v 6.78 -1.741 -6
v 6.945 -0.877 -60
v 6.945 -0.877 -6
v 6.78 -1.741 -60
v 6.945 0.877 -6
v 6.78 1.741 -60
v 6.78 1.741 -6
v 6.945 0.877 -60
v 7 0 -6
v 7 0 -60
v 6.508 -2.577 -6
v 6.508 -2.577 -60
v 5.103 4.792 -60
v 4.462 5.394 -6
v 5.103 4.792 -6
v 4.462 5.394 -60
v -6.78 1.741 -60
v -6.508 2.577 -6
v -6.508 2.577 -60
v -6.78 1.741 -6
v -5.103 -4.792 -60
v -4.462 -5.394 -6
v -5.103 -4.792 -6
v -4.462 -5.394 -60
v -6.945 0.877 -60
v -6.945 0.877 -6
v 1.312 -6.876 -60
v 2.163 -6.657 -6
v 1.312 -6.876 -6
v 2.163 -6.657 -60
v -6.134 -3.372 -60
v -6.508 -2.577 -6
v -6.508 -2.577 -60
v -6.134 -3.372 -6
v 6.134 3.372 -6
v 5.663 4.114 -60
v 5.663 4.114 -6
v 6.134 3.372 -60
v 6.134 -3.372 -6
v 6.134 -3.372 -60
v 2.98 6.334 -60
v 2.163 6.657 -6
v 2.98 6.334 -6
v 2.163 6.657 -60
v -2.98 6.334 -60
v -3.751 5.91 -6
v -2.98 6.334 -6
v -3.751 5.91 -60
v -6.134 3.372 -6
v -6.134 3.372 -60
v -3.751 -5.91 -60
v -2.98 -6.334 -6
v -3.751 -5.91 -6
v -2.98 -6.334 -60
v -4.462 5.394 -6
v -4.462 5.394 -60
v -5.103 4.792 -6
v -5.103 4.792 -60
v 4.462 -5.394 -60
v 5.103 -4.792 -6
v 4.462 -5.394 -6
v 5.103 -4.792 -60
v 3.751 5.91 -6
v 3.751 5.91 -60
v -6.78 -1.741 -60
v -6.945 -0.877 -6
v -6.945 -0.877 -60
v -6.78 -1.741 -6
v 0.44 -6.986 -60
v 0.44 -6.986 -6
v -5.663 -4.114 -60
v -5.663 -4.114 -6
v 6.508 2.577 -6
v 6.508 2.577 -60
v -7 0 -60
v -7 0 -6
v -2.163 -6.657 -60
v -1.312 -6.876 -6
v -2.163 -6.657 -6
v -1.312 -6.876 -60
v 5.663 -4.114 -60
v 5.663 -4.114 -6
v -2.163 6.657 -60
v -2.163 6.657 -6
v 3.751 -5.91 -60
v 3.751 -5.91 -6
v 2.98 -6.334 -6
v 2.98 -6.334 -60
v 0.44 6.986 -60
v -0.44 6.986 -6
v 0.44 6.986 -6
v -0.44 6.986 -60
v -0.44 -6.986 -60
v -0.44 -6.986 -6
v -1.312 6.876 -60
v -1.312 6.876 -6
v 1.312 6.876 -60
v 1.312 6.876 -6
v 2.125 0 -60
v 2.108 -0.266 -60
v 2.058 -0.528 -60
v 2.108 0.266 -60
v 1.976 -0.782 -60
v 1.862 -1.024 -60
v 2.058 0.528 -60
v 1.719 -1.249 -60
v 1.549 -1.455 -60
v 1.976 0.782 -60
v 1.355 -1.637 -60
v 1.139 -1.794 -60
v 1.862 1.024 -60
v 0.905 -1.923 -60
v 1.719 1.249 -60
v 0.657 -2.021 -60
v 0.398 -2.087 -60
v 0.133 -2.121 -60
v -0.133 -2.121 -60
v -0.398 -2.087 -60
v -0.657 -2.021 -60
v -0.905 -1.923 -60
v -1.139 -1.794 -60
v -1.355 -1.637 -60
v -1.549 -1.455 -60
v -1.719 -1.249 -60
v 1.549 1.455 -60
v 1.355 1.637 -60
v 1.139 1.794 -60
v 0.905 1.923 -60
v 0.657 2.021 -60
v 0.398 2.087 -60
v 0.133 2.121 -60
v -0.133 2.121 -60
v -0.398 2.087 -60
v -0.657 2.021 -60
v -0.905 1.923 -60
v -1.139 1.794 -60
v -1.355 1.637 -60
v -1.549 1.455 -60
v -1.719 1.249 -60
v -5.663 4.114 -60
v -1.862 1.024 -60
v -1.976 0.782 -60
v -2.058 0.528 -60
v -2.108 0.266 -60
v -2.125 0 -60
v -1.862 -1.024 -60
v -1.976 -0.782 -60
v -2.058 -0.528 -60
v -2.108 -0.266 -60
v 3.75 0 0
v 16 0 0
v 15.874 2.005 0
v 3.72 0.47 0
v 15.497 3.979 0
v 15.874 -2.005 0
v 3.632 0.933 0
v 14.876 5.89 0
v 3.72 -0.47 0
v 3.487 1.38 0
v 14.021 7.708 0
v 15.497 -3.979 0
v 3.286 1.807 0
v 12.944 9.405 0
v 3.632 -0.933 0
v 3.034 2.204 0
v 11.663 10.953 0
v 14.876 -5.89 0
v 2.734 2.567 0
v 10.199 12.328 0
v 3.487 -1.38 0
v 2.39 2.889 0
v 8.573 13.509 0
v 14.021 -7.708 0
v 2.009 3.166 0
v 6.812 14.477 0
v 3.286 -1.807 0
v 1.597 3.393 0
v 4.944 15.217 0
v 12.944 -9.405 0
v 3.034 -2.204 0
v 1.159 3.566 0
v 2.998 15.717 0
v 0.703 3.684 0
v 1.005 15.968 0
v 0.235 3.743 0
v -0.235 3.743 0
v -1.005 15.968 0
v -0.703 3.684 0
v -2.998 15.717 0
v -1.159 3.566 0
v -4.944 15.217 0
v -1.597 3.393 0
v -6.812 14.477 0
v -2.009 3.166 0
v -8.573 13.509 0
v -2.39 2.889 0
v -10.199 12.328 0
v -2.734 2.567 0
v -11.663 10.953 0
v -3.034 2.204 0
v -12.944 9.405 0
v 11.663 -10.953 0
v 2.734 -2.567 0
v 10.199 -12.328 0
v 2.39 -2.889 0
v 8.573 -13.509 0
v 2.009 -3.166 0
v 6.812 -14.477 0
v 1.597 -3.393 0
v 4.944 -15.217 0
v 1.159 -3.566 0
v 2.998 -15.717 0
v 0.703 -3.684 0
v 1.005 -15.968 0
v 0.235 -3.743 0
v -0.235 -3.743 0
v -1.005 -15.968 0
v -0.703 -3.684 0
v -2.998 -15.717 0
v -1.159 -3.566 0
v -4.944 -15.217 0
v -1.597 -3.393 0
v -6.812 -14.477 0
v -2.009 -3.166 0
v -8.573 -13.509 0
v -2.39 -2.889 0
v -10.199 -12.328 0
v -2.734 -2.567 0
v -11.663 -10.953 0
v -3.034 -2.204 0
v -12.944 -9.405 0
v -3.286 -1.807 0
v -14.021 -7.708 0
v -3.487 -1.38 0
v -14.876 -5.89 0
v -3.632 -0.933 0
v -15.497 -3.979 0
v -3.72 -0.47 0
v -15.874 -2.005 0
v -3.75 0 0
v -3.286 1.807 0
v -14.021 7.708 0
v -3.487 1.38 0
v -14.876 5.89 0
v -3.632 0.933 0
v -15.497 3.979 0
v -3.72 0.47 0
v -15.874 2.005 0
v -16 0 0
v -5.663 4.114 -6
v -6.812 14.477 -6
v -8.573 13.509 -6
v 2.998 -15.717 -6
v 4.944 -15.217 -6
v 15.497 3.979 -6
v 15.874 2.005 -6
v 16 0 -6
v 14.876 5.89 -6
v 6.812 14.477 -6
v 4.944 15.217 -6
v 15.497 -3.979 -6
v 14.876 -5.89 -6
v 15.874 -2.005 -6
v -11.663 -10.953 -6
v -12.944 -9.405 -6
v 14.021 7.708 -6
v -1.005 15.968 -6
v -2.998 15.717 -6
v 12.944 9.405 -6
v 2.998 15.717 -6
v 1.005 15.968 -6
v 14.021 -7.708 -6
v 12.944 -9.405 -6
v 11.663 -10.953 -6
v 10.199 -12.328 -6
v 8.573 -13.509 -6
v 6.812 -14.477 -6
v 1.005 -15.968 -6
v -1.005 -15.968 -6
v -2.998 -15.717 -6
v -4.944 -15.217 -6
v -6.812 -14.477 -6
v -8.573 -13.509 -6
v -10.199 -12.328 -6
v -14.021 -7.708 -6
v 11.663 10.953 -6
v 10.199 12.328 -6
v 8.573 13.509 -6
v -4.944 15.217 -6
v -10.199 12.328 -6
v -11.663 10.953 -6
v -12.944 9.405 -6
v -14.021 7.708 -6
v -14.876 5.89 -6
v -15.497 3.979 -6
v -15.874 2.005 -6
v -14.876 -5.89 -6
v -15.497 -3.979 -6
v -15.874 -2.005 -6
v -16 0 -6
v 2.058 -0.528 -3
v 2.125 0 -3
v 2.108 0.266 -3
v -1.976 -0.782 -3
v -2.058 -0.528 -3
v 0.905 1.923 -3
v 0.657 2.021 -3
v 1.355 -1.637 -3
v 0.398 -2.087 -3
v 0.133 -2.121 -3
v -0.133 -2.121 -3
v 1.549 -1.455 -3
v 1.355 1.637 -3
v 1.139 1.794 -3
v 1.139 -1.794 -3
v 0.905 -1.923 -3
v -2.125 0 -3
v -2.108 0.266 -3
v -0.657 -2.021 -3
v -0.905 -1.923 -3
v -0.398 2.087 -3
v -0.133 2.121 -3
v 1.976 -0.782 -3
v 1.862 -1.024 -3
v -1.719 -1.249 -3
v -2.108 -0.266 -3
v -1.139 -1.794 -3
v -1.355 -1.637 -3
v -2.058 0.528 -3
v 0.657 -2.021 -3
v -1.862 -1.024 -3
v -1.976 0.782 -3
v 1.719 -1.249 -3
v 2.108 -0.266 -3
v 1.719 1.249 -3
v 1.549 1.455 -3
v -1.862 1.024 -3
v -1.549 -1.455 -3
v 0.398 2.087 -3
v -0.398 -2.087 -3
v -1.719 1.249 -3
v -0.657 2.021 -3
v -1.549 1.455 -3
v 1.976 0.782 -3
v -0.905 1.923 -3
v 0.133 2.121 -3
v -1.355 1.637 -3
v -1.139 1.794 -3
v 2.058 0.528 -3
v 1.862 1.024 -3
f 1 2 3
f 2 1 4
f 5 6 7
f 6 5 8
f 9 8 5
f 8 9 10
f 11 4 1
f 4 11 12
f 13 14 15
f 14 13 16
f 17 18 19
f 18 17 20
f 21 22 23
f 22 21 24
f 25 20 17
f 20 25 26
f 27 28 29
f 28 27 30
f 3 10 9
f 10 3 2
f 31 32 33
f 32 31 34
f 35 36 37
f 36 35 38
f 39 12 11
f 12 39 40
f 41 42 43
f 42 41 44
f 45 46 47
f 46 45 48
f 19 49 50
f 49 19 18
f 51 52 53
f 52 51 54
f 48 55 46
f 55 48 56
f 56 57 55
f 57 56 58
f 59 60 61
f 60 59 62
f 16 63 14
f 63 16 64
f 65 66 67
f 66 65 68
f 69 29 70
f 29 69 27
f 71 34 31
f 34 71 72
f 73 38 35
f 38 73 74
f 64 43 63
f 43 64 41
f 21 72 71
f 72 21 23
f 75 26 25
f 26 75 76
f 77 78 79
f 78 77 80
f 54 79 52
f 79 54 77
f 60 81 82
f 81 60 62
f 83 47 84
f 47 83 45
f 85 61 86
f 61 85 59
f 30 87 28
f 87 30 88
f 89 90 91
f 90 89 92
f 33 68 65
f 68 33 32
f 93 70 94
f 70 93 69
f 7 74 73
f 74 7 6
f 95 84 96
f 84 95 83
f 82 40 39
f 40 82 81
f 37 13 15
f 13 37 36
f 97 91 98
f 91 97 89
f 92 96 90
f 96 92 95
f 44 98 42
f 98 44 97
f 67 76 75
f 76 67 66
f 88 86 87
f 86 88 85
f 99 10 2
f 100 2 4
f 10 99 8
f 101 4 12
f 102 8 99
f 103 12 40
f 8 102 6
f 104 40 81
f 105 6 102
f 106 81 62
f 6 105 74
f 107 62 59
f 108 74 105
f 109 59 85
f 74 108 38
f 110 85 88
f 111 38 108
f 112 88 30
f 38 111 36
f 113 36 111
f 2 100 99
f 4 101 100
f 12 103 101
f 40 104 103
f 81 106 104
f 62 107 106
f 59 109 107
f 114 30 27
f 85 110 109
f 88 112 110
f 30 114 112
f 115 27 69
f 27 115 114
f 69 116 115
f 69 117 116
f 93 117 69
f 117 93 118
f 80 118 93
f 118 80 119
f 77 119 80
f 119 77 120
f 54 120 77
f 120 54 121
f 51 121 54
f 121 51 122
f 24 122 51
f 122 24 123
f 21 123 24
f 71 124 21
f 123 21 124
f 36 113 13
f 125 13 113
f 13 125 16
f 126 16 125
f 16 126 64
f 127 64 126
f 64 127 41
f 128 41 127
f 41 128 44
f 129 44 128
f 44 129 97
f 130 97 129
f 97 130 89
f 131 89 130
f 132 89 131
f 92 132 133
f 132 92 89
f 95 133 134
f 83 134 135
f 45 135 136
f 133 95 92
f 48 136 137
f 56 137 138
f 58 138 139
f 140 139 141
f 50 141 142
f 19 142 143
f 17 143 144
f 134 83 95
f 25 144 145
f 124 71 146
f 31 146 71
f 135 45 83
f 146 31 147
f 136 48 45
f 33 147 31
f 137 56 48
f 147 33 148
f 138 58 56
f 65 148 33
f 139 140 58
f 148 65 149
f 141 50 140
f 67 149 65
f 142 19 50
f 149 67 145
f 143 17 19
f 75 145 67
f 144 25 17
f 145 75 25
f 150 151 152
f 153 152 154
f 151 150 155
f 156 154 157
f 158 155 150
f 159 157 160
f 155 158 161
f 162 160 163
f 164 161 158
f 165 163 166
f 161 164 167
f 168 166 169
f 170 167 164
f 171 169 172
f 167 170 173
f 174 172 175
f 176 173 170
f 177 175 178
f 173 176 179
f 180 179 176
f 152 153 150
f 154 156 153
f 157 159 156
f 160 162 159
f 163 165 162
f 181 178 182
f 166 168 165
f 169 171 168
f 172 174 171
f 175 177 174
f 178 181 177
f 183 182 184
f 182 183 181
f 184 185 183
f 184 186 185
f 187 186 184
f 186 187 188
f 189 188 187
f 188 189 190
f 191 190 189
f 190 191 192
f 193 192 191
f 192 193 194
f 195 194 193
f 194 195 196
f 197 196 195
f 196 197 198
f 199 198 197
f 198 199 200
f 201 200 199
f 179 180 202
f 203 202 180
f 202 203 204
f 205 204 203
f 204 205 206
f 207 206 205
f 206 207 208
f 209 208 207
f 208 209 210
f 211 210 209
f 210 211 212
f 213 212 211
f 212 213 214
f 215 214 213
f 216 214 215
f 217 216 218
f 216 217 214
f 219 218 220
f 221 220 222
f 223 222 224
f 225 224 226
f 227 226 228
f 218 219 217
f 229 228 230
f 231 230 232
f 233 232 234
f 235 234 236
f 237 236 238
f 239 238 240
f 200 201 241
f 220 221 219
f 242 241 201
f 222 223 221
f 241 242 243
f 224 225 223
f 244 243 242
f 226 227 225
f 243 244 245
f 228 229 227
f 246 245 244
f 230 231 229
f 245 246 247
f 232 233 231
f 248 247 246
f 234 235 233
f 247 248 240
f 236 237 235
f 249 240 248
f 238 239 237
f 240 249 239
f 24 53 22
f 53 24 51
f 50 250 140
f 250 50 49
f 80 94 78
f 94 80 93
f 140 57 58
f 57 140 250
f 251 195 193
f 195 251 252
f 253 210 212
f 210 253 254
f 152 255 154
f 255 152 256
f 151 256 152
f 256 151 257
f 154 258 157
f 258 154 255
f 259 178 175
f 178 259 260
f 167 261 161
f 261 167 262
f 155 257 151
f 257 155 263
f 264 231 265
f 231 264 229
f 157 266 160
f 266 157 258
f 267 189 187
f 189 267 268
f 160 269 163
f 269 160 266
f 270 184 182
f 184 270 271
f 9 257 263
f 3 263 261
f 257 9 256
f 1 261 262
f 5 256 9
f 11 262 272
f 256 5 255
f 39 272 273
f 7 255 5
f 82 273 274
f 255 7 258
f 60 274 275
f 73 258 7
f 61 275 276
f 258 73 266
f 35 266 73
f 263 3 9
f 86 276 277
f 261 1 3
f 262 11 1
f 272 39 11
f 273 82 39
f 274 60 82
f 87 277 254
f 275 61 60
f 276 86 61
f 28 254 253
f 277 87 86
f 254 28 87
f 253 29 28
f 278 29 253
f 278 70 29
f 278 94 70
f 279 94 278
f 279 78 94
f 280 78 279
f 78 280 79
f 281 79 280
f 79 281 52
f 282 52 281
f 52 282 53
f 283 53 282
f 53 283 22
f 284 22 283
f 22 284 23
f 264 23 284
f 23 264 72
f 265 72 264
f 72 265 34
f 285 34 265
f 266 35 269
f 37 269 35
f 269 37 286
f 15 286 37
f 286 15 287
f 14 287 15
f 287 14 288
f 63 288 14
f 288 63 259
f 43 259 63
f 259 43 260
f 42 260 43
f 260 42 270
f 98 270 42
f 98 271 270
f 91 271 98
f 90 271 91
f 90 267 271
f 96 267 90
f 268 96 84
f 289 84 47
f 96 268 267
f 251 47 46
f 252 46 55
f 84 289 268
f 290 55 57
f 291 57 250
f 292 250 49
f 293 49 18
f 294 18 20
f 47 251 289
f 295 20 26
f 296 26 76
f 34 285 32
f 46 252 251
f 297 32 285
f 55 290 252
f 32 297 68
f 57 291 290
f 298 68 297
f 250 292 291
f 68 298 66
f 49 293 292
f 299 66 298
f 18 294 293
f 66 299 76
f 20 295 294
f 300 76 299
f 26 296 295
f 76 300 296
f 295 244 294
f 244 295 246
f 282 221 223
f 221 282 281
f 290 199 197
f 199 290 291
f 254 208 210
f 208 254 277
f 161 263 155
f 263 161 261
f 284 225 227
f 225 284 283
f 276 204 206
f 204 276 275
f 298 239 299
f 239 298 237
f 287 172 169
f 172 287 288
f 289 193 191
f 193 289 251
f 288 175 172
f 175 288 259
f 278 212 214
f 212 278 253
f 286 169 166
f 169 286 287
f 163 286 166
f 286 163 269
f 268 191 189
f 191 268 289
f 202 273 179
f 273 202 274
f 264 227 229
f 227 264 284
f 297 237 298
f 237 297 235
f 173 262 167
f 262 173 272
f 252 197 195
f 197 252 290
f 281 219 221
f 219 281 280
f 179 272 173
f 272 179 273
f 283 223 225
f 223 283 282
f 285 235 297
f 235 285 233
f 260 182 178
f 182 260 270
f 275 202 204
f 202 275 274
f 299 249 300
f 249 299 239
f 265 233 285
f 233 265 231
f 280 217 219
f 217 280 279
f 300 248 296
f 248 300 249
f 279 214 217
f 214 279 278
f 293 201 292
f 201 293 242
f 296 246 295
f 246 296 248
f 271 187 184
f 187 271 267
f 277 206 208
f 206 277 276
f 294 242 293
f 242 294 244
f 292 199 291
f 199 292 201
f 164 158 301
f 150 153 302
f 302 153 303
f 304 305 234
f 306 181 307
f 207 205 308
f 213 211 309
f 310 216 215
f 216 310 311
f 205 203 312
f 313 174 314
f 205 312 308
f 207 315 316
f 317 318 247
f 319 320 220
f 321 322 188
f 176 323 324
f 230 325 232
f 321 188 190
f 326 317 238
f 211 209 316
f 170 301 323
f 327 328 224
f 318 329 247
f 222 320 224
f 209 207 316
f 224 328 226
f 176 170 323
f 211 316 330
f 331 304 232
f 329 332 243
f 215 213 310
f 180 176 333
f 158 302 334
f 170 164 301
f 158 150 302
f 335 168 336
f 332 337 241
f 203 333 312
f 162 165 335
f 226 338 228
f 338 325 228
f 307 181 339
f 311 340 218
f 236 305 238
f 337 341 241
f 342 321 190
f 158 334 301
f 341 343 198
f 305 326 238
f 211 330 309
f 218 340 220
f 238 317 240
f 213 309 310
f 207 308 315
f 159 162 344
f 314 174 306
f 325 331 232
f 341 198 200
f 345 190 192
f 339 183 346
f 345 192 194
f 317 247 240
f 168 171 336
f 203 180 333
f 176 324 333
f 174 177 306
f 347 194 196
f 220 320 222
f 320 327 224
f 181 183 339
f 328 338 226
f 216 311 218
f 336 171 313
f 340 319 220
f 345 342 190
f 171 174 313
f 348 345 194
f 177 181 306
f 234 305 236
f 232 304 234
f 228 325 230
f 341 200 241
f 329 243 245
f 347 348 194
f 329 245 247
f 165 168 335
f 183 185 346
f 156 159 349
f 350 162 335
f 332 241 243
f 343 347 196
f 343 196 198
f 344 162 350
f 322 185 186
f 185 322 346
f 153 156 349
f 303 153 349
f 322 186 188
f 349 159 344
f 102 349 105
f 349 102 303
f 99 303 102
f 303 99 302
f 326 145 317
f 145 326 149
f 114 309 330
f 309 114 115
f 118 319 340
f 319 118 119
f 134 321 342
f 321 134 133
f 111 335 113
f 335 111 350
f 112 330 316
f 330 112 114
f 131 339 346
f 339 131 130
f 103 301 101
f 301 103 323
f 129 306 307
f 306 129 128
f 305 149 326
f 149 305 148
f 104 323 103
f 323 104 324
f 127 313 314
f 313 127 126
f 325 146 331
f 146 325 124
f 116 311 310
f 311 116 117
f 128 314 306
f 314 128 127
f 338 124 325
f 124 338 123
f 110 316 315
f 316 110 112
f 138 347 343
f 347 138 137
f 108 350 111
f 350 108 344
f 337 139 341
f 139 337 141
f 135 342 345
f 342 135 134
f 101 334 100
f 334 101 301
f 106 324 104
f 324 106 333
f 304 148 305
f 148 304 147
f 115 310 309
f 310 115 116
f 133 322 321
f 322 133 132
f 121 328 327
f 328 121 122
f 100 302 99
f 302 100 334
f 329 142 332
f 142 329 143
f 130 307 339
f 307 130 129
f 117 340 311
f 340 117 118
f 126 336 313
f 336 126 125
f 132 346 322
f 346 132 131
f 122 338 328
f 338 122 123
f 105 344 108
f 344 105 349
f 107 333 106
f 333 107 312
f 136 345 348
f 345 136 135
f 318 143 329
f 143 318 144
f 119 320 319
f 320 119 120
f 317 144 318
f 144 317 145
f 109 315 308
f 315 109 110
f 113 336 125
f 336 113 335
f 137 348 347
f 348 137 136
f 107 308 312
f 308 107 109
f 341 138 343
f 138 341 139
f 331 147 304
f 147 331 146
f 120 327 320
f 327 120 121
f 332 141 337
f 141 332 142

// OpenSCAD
$fn = 50;


difference() {
	union() {
		translate(v = [0, 0, -60.0000000000]) {
			cylinder(h = 60, r = 7.0000000000);
		}
		translate(v = [0, 0, -6.0000000000]) {
			cylinder(h = 6, r = 16.0000000000);
		}
	}
	union() {
		translate(v = [0, 0, 0]) {
			rotate(a = [0, 0, 0]) {
				difference() {
					union() {
						#translate(v = [0, 0, -60.0000000000]) {
							cylinder(h = 60, r = 2.0000000000);
						}
						#translate(v = [0, 0, -3]) {
							cylinder(h = 3, r = 7.0000000000, r1 = 2.1250000000, r2 = 3.7500000000);
						}
						#translate(v = [0, 0, -60.0000000000]) {
							cylinder(h = 60, r = 2.1250000000);
						}
						#translate(v = [0, 0, -60.0000000000]) {
							cylinder(h = 60, r = 2.0000000000);
						}
					}
					union();
				}
			}
		}
	}
}
